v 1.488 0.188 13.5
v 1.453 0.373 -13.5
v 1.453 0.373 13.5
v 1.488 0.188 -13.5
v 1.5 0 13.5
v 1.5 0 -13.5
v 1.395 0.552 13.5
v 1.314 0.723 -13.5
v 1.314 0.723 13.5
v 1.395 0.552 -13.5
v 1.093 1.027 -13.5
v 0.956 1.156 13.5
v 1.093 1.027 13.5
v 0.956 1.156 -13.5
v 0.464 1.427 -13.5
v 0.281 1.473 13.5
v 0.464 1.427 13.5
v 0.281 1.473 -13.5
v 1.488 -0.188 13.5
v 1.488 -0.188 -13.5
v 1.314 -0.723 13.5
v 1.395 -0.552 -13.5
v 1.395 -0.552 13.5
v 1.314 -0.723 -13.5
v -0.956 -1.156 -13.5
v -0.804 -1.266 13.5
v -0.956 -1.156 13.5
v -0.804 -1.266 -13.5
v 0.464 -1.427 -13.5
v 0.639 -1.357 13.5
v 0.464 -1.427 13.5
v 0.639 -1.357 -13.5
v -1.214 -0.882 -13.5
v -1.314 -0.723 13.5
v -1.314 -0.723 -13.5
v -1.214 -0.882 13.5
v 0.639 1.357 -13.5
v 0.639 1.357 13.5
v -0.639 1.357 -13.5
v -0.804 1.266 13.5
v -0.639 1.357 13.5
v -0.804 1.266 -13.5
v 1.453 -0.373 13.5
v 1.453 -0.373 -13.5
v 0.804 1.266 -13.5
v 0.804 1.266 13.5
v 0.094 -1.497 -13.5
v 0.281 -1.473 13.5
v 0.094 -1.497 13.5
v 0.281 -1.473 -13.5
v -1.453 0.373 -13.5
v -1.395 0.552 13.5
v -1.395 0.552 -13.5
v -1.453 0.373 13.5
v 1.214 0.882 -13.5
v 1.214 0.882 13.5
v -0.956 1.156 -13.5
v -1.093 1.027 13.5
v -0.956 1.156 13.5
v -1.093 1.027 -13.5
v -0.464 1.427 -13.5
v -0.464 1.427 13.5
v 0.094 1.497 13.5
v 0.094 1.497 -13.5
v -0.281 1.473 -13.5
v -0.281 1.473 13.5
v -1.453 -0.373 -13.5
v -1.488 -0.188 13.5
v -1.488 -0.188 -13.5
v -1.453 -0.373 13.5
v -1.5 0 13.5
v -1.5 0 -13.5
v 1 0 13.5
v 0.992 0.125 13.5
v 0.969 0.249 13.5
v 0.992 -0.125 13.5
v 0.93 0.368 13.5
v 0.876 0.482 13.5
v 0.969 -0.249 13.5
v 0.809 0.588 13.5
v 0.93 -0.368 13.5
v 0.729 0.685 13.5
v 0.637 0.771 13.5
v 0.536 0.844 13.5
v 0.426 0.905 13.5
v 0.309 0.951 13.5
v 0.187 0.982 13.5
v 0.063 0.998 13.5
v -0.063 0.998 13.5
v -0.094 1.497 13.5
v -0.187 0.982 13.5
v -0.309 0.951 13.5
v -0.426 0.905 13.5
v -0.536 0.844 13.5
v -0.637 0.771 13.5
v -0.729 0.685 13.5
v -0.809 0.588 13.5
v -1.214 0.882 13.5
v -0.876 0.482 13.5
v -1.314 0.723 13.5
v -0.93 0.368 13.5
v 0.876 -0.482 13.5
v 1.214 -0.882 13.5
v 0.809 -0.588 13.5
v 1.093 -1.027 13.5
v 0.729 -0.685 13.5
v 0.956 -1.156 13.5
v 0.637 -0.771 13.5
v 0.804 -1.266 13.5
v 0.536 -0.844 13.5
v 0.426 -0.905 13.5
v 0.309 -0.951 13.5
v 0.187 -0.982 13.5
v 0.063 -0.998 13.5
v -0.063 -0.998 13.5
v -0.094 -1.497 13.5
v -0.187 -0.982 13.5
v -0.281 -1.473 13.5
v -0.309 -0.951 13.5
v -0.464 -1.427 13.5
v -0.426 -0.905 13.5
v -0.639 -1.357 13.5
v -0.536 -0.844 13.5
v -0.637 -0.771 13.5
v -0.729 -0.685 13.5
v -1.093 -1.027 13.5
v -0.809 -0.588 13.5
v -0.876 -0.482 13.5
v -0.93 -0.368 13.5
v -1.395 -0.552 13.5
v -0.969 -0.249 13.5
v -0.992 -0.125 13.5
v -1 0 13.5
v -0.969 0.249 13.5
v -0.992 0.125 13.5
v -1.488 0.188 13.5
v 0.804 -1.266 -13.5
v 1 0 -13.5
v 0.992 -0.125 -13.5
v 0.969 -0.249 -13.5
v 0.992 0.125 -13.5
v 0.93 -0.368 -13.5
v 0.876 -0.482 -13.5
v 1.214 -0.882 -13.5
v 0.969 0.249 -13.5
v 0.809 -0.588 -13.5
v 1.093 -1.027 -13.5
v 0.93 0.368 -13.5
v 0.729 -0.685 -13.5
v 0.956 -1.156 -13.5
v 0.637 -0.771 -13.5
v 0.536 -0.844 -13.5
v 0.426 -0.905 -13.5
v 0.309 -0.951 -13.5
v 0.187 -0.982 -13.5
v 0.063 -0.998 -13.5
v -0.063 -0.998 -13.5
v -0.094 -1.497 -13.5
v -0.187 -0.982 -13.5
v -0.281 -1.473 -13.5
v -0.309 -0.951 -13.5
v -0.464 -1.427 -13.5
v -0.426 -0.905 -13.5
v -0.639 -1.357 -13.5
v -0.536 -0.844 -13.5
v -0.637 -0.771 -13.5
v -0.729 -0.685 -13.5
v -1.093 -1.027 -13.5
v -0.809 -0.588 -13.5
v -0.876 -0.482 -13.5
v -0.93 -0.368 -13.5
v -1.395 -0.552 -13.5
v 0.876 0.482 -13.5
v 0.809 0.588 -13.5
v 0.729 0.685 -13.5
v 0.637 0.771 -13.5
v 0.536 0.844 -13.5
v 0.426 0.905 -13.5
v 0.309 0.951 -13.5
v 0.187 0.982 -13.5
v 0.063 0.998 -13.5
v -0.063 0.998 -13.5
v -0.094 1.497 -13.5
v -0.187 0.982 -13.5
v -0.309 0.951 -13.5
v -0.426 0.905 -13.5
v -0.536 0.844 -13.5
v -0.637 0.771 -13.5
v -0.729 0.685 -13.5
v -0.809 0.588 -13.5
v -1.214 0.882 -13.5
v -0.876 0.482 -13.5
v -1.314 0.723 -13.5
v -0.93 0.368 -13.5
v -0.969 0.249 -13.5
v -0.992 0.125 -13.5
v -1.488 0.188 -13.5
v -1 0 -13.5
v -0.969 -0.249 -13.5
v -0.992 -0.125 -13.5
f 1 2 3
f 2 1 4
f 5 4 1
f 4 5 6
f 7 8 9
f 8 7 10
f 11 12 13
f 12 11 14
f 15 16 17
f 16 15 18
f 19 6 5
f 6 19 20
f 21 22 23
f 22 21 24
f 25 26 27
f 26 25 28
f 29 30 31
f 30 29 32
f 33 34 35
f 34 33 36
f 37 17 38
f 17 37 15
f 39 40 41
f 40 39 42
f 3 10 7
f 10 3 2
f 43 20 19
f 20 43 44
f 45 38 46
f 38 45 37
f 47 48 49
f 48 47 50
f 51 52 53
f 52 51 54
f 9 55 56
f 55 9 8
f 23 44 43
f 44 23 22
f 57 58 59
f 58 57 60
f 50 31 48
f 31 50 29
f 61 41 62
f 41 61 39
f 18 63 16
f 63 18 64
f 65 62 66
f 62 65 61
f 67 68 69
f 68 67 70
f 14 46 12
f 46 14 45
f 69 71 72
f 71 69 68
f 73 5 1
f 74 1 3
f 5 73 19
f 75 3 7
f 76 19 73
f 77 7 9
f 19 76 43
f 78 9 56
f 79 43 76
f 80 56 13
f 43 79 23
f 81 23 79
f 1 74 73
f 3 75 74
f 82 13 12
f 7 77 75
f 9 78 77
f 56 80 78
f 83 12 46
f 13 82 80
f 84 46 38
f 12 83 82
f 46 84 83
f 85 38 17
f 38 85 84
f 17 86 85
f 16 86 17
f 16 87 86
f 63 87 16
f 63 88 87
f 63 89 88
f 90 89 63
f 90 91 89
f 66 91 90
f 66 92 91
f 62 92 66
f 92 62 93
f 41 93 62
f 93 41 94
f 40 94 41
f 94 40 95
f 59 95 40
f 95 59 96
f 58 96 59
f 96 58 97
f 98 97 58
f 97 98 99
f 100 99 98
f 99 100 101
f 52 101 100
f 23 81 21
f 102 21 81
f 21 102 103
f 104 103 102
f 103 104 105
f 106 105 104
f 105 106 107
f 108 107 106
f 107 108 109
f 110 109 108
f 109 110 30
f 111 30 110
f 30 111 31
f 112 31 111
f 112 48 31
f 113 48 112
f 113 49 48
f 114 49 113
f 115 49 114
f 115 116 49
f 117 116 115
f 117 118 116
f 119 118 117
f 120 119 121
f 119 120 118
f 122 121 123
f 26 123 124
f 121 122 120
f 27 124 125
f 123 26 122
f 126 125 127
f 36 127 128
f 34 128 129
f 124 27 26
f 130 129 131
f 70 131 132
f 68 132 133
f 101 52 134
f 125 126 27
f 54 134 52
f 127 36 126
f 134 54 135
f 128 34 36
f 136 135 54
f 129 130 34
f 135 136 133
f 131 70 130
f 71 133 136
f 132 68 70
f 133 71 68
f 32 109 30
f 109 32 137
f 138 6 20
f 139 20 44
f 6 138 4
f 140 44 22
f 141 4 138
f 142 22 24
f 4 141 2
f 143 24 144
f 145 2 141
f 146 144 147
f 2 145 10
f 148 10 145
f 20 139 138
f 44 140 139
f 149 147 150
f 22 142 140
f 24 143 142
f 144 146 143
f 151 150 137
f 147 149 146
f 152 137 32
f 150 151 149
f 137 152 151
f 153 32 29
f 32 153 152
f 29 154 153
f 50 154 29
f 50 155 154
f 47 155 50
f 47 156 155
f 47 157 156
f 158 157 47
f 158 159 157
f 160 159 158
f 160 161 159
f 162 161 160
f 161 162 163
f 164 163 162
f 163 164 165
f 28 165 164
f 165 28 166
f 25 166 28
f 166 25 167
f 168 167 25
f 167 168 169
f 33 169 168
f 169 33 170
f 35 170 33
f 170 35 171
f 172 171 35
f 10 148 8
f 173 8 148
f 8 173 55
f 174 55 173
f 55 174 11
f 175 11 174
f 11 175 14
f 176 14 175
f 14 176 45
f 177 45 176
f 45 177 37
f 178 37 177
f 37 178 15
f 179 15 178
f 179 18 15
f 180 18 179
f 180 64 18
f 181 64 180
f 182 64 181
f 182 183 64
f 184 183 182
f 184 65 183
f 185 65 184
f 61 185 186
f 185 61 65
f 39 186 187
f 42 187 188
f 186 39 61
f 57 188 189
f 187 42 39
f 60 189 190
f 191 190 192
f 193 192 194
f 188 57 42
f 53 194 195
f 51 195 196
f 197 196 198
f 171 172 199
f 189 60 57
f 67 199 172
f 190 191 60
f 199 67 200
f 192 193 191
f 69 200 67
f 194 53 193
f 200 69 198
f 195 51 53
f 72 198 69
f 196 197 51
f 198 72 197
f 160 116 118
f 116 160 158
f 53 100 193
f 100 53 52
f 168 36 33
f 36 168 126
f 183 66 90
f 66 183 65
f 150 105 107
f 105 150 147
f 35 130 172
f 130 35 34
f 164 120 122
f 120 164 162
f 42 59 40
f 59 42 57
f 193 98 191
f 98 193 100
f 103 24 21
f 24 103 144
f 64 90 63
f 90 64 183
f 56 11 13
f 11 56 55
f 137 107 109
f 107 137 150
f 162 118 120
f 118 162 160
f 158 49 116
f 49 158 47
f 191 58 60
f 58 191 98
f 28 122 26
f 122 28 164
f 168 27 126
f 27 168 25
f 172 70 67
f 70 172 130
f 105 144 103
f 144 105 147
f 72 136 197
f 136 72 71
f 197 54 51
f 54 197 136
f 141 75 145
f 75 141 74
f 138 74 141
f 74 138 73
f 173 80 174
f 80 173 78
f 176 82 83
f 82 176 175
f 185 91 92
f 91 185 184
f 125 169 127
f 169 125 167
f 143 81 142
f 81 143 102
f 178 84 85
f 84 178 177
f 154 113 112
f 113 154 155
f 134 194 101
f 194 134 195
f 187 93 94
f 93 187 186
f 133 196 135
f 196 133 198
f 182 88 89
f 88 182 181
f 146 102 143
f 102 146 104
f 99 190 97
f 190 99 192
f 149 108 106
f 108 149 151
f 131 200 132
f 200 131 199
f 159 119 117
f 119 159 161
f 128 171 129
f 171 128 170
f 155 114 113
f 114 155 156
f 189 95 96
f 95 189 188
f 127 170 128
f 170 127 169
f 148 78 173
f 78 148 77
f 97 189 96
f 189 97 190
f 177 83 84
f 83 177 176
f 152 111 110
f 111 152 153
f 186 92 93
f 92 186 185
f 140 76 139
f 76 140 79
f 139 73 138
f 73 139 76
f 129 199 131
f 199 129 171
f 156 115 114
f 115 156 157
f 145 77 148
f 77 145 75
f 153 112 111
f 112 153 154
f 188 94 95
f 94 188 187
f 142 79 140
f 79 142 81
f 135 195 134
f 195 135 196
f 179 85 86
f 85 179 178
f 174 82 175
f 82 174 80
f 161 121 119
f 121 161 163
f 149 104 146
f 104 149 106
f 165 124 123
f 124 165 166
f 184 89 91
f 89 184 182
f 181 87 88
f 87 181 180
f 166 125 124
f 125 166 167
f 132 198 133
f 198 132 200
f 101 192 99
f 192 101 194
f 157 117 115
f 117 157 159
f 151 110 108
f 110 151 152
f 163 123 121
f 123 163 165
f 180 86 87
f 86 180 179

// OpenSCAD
$fn = 50;


difference() {
	union() {
		translate(v = [0, 0, -13.5000000000]) {
			cylinder(h = 27, r = 1.5000000000);
		}
	}
	union() {
		translate(v = [0, 0, -100.0000000000]) {
			cylinder(h = 200, r = 1.0000000000);
		}
	}
}
